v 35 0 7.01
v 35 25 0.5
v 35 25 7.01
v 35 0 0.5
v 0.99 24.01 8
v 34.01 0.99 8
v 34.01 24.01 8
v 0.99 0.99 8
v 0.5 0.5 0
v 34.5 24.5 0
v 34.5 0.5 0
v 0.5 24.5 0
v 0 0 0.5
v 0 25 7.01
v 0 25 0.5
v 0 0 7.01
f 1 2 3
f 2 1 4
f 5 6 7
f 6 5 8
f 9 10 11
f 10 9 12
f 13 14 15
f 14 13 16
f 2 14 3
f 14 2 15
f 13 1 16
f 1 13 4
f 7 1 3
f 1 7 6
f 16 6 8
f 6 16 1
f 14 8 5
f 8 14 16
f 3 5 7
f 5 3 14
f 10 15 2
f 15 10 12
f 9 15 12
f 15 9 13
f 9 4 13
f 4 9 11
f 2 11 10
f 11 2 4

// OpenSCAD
// units=mm — generated by scad_emitter.py
// part=unnamed
$fn = 48;

intersection() { intersection() { cube([35, 25, 8]); hull() { translate([0, 0, 0]) linear_extrude(height=0.01) offset(r=0) square([35, 25]); translate([1, 1, 8]) linear_extrude(height=0.01) offset(r=0) square([33, 23]); translate([0, 0, 7]) linear_extrude(height=0.01) offset(r=0) square([35, 25]); } } hull() { translate([0.5, 0.5, 0]) linear_extrude(height=0.01) offset(r=0) square([34, 24]); translate([0, 0, 0.5]) linear_extrude(height=0.01) offset(r=0) square([35, 25]); translate([0, 0, 8]) linear_extrude(height=0.01) offset(r=0) square([35, 25]); } }
